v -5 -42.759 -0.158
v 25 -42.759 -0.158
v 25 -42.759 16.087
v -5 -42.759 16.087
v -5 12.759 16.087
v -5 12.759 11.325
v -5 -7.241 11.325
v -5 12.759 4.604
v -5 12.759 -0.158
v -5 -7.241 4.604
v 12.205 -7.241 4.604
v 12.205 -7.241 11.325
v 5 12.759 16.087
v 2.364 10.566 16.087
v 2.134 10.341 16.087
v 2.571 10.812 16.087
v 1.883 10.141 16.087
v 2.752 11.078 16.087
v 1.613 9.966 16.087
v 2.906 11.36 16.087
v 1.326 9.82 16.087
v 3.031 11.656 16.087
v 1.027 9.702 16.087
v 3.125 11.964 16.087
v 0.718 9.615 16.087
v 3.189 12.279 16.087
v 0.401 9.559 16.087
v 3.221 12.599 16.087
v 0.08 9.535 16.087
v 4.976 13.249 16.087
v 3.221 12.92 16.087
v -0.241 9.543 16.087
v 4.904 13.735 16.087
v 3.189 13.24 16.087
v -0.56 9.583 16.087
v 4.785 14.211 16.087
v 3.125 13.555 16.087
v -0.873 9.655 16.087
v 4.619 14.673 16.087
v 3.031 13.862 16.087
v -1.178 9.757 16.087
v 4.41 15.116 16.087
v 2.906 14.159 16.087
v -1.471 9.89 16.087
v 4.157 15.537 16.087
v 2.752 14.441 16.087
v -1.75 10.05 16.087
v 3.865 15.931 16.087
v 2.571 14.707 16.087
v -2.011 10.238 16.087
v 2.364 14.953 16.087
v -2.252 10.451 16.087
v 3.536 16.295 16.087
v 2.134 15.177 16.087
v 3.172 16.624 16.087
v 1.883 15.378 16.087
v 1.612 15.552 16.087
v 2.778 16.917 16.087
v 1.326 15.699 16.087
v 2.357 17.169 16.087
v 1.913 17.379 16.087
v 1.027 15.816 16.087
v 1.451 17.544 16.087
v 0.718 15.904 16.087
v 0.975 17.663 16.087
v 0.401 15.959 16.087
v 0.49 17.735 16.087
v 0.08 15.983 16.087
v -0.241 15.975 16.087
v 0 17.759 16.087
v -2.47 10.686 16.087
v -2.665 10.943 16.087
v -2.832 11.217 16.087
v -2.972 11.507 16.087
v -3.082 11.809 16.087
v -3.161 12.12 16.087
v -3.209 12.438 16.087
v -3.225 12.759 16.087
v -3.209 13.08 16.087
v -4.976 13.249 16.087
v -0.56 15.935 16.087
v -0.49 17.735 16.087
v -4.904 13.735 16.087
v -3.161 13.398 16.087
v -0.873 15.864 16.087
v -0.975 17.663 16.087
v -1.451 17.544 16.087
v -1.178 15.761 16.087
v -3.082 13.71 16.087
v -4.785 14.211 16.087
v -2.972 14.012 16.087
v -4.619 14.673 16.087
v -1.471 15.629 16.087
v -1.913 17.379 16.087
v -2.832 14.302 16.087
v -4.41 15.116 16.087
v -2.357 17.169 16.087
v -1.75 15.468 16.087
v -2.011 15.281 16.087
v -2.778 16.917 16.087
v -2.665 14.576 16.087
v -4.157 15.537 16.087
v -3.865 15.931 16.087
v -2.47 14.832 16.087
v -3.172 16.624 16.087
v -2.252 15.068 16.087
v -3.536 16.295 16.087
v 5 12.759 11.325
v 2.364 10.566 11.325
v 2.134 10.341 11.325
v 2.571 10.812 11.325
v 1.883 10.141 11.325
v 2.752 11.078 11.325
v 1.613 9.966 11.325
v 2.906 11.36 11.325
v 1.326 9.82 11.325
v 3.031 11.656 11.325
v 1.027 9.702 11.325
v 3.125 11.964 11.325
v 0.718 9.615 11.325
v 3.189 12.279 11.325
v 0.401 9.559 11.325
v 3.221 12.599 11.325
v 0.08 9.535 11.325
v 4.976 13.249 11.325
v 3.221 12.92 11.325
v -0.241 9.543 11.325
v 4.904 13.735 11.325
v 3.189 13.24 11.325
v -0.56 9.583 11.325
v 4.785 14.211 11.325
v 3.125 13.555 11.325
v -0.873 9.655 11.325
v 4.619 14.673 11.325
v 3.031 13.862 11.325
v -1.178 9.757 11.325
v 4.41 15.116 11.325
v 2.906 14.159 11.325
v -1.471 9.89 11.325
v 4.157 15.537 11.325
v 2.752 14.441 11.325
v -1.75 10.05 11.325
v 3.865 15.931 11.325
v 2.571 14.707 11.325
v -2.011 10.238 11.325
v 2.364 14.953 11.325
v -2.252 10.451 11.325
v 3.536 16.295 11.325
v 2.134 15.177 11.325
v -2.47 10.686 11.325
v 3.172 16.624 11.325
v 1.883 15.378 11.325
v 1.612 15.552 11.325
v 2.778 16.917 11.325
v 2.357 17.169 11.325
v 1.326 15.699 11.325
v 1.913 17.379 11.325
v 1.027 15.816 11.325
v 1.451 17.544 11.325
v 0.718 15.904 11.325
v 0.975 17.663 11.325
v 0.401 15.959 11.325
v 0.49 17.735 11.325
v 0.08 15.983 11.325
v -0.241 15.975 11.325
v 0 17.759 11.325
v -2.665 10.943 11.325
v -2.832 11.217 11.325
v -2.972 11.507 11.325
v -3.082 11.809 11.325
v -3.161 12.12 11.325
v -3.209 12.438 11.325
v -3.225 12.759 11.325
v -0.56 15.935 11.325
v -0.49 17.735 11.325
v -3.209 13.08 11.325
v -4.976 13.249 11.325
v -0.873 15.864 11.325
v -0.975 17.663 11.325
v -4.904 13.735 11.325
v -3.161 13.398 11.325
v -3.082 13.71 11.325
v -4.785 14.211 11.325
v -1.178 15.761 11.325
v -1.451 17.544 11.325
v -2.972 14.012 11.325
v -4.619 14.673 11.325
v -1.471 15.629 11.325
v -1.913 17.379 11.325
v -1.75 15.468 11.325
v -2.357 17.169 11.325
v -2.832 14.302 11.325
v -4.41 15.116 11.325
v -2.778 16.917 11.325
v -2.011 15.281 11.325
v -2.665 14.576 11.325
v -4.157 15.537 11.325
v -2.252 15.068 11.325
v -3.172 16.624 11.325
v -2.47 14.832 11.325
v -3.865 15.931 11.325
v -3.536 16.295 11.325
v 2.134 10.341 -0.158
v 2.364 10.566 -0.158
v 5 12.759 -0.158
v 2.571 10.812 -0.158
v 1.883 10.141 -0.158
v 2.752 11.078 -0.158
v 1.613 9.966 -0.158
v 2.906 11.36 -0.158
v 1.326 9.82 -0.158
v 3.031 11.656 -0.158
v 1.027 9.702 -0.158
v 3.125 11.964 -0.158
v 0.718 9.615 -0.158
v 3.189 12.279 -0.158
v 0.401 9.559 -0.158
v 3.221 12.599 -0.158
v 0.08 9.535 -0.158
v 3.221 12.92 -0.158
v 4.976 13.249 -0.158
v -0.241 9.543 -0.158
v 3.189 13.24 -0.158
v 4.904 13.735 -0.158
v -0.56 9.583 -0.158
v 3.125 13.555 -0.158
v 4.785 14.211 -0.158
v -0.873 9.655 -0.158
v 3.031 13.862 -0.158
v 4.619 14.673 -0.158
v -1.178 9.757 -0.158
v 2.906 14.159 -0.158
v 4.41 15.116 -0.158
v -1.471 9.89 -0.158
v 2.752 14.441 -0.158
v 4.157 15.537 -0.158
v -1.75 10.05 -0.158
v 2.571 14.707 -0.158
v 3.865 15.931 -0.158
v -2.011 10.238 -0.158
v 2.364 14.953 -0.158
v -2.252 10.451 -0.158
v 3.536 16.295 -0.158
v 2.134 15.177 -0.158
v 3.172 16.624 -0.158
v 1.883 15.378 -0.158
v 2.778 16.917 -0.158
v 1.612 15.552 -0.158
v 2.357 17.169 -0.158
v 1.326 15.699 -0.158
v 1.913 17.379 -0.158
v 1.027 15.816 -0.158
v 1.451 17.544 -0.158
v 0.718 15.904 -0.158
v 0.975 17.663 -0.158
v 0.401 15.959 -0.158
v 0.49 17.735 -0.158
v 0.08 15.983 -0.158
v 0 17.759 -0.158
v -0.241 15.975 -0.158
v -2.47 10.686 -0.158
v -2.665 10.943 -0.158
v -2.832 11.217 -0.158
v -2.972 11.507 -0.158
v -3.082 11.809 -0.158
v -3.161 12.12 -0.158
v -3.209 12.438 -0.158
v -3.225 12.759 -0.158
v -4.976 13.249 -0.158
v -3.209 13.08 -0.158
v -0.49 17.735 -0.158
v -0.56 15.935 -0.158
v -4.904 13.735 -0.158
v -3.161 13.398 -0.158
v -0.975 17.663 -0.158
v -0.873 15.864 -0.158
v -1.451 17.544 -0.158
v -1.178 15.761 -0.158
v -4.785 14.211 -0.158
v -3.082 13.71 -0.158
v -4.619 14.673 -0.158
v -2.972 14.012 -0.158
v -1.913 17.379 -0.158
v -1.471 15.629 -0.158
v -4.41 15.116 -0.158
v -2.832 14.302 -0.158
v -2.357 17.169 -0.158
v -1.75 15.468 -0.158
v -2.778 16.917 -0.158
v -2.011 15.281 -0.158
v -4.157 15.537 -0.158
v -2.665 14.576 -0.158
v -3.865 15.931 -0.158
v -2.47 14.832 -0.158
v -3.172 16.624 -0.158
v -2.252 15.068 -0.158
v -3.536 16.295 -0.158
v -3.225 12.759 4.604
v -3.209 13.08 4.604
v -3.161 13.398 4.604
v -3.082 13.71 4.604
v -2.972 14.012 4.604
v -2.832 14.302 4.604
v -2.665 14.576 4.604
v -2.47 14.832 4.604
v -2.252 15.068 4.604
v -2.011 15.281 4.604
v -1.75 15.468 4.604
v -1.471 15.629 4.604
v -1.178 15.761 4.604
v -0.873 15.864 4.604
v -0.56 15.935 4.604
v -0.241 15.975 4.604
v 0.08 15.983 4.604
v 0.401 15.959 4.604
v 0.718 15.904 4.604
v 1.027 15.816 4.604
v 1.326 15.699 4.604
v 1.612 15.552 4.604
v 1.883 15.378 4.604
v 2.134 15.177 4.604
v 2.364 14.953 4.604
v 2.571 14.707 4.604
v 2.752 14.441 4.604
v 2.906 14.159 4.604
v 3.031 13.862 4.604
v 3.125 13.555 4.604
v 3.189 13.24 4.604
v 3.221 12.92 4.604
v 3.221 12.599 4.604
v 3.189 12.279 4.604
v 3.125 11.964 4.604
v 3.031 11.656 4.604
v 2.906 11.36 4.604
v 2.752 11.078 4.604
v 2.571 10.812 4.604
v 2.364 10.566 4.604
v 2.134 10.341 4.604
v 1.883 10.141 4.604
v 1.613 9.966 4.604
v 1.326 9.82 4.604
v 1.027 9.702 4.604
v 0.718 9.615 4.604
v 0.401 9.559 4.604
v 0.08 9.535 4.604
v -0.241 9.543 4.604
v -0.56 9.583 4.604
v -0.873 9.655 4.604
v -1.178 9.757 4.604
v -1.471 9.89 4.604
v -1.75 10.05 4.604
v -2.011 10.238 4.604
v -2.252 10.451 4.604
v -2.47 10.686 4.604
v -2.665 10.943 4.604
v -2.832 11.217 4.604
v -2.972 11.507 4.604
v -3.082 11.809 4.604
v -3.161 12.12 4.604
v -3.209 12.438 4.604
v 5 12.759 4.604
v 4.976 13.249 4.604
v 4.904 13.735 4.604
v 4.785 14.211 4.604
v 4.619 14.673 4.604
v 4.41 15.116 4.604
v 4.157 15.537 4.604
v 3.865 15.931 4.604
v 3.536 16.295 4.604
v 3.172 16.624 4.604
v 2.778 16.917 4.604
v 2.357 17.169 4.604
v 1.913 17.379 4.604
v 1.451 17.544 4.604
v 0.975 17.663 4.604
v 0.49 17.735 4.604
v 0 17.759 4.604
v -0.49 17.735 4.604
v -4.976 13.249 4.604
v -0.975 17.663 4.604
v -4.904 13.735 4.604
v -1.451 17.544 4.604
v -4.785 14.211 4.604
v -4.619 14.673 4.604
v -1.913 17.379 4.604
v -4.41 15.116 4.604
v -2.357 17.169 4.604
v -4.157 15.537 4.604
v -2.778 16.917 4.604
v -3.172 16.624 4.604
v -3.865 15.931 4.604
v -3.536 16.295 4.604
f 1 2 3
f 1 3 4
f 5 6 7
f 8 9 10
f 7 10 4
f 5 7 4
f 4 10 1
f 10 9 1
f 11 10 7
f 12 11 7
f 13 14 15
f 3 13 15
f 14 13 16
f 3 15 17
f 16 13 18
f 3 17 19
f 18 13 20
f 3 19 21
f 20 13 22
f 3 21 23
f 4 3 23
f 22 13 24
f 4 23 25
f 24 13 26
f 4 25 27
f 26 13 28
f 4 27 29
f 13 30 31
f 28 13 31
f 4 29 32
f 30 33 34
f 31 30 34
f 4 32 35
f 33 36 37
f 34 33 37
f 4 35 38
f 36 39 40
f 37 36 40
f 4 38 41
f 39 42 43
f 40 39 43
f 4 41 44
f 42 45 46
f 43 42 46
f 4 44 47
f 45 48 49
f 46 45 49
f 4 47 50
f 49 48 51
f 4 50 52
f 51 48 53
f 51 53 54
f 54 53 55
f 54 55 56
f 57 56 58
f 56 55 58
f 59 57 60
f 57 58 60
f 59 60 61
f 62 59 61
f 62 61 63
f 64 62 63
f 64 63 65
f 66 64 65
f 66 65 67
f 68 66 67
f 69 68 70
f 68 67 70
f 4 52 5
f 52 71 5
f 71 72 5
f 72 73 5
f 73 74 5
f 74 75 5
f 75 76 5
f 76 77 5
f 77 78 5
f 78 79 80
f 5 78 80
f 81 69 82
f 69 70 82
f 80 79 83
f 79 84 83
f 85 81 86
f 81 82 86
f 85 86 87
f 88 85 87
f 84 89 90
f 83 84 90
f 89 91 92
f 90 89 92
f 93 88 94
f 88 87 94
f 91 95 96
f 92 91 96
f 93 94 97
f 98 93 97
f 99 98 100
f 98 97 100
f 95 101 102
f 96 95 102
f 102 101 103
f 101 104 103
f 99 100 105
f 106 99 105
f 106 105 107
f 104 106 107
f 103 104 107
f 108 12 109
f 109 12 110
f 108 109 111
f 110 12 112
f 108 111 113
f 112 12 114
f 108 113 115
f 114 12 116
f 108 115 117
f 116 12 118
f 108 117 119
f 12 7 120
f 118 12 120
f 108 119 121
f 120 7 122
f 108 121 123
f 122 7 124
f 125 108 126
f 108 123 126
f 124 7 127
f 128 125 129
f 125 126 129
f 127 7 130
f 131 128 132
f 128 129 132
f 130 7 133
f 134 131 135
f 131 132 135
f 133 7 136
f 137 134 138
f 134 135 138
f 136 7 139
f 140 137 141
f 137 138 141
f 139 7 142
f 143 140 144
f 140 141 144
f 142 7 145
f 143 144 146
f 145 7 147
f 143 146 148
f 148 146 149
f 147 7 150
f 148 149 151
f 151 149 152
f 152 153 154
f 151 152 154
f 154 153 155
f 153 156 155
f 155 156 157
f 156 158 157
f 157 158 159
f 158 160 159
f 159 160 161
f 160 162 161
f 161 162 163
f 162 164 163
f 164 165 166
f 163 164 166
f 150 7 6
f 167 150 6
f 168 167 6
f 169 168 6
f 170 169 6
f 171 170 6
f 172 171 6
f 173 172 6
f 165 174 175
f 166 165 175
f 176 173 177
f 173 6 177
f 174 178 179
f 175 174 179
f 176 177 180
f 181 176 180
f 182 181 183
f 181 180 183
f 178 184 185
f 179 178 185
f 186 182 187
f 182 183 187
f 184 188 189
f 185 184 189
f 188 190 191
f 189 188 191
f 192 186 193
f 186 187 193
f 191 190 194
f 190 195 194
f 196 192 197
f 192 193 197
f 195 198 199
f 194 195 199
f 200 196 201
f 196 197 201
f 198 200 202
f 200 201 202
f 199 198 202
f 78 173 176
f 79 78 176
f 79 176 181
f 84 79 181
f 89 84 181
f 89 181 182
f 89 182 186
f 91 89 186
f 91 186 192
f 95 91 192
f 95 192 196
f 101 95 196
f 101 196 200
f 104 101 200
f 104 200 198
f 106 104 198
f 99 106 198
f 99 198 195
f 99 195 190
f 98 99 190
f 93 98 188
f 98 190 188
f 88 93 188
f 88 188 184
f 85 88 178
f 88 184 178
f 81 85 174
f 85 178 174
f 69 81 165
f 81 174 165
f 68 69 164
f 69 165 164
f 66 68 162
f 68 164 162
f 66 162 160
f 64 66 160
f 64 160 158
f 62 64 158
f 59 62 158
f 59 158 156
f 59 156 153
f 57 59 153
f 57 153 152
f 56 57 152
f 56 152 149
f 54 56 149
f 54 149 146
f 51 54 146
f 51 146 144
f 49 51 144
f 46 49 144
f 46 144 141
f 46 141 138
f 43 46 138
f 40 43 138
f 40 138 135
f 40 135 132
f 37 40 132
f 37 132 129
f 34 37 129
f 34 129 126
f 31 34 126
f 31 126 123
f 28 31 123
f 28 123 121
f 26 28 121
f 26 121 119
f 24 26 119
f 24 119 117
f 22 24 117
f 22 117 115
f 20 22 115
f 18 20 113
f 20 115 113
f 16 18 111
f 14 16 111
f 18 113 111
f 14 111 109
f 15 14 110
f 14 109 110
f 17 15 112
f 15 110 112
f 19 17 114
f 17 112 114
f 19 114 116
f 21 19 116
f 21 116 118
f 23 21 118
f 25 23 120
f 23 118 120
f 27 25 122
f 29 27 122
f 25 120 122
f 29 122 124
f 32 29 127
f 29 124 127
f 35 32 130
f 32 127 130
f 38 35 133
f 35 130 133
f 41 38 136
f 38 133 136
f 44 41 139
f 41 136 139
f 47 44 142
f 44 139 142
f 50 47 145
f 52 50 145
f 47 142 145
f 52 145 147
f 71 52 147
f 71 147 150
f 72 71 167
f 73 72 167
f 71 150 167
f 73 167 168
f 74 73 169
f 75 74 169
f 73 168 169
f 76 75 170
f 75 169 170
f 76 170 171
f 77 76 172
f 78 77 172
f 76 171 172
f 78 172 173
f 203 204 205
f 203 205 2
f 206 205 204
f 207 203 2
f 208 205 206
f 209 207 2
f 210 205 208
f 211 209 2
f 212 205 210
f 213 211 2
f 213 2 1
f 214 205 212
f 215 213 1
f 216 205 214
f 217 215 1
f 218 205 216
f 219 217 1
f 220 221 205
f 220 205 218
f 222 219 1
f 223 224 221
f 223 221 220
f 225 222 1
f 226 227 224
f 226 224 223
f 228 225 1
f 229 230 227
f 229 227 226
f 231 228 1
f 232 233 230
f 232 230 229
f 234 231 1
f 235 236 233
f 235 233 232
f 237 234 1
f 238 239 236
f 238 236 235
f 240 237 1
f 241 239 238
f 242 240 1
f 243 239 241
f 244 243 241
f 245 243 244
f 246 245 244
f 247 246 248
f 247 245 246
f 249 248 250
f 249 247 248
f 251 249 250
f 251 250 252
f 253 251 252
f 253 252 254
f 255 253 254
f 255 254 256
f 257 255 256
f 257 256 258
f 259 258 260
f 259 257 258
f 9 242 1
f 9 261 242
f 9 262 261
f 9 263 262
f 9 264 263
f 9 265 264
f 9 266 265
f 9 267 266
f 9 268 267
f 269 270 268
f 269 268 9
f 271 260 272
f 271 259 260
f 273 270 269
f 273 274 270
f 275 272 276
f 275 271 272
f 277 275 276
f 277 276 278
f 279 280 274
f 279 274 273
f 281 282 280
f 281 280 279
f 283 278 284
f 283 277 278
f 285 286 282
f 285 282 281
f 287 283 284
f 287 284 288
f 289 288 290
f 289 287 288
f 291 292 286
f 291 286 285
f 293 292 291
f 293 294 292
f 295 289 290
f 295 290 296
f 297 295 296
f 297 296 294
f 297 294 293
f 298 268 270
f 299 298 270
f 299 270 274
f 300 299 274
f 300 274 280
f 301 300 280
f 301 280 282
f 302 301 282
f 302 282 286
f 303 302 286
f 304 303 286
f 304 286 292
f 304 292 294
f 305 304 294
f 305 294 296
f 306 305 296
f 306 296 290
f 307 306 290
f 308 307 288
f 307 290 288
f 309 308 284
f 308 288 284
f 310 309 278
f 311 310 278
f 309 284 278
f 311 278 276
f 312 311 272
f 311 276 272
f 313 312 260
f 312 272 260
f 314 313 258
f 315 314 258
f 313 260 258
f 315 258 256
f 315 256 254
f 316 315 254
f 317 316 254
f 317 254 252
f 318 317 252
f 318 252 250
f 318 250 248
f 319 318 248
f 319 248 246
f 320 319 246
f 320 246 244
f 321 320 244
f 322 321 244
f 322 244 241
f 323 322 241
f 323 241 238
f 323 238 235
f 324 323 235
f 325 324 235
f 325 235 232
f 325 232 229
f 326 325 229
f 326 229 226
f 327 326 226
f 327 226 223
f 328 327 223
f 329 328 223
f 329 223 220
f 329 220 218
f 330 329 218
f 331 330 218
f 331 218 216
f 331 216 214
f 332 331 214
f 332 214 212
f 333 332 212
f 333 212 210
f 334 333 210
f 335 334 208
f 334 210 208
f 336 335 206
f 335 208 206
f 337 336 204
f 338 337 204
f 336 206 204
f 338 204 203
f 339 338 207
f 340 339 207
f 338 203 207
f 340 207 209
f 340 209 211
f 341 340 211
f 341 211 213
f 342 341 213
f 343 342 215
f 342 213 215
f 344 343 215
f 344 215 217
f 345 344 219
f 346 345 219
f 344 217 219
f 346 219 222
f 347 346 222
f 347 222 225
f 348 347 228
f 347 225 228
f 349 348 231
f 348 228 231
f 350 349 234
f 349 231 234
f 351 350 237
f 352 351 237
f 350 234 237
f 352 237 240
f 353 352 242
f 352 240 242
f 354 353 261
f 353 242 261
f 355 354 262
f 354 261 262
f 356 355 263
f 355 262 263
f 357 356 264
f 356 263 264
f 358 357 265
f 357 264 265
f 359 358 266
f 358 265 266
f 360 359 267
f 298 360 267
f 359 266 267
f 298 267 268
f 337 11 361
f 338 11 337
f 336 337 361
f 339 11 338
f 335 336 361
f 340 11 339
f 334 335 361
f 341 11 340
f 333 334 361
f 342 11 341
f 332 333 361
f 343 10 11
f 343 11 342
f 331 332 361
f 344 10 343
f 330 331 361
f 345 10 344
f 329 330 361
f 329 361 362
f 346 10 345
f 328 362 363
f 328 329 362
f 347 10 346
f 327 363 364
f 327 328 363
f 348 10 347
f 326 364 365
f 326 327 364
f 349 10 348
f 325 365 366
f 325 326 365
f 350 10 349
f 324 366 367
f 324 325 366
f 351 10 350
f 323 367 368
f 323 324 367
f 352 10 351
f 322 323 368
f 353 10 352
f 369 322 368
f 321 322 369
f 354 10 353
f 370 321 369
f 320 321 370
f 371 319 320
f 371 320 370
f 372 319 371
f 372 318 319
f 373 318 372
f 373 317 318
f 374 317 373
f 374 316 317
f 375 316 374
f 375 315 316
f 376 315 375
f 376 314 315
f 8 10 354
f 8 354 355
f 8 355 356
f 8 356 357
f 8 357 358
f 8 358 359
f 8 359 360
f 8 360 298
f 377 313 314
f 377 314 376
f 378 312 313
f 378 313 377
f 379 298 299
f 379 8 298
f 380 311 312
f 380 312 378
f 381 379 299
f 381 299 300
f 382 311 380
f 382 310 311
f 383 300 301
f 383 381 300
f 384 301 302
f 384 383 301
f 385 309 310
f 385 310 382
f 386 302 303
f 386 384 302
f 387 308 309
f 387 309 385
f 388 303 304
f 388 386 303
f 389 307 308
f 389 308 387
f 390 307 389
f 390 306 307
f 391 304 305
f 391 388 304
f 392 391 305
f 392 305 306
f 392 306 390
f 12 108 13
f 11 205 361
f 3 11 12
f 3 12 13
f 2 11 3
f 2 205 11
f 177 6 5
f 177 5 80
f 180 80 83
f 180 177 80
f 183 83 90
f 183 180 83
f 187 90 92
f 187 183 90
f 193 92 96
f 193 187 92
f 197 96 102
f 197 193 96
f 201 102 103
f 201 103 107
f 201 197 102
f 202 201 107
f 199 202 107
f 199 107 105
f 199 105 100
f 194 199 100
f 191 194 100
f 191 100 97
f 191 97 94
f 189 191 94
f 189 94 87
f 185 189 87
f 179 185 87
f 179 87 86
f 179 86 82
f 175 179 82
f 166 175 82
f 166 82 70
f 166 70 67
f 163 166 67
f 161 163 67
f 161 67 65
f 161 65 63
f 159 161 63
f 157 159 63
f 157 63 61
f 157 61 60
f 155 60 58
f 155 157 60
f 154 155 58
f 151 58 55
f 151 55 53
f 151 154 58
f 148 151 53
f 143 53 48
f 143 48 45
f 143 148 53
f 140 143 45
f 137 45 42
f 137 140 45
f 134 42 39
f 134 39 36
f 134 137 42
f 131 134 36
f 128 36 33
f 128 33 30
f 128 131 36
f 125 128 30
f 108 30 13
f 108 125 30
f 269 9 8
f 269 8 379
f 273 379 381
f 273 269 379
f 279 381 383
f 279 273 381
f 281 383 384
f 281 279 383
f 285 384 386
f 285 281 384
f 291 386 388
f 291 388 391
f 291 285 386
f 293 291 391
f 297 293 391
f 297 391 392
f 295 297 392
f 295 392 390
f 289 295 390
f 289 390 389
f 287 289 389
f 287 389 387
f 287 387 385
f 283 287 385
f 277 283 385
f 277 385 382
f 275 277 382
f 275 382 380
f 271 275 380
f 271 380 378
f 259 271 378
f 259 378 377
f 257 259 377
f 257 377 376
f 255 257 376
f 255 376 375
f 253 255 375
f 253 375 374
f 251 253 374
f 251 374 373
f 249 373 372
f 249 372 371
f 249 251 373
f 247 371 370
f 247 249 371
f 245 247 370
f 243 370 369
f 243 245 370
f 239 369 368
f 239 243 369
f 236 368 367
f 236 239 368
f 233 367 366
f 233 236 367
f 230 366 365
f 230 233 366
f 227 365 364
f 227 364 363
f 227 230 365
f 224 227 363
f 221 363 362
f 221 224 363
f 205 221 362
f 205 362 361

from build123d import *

# Parameters (mm, degrees)
RESSALTO_EXTRUS_O1_DEPTH      = 16.0875
RESSALTO_EXTRUS_O1_DEPTH_BACK = 0.158383869
ESBO_O2_W                     = 6.720883869
ESBO_O2_H                     = 25
CORTE_EXTRUS_O1_DEPTH         = 55.655025447
ESBO_O3_R                     = 3.225
CORTE_EXTRUS_O2_DEPTH         = 53.127659578


with BuildPart() as part:
    # Esboço1 → Ressalto-extrusão1 (new, two sides: drawn at the far end of the back side and taken through both)
    with BuildSketch(Plane.XY.offset(-RESSALTO_EXTRUS_O1_DEPTH_BACK)):
        with BuildLine():
            ThreePointArc((-5, 12.759375), (0, 17.759375), (5, 12.759375))
            Line((5, 12.759375), (5, -12.759375))
            Line((5, -12.759375), (-5, -12.759375))
            Line((-5, -12.759375), (-5, 12.759375))
        make_face()
        Polygon((-5, -42.759375), (-5, -12.759375), (5, -12.759375), (5, 12.759375), (25, -42.759375), align=None)
    extrude(amount=RESSALTO_EXTRUS_O1_DEPTH + RESSALTO_EXTRUS_O1_DEPTH_BACK)

    # Esboço2 → Corte-extrusão1 (cut, through all)
    with BuildSketch(Plane.ZY.offset(5)):
        with Locations((7.964558066, 5.259375)):
            Rectangle(ESBO_O2_W, ESBO_O2_H)
    extrude(amount=-CORTE_EXTRUS_O1_DEPTH, mode=Mode.SUBTRACT)

    # Esboço3 → Corte-extrusão2 (cut, through all)
    with BuildSketch(Plane(origin=(0, 0, -0.158383869), x_dir=(-1, 0, 0), z_dir=(0, 0, -1))):
        with Locations((0, 12.759375)):
            Circle(ESBO_O3_R)
    extrude(amount=-CORTE_EXTRUS_O2_DEPTH, mode=Mode.SUBTRACT)


solid = part.part
